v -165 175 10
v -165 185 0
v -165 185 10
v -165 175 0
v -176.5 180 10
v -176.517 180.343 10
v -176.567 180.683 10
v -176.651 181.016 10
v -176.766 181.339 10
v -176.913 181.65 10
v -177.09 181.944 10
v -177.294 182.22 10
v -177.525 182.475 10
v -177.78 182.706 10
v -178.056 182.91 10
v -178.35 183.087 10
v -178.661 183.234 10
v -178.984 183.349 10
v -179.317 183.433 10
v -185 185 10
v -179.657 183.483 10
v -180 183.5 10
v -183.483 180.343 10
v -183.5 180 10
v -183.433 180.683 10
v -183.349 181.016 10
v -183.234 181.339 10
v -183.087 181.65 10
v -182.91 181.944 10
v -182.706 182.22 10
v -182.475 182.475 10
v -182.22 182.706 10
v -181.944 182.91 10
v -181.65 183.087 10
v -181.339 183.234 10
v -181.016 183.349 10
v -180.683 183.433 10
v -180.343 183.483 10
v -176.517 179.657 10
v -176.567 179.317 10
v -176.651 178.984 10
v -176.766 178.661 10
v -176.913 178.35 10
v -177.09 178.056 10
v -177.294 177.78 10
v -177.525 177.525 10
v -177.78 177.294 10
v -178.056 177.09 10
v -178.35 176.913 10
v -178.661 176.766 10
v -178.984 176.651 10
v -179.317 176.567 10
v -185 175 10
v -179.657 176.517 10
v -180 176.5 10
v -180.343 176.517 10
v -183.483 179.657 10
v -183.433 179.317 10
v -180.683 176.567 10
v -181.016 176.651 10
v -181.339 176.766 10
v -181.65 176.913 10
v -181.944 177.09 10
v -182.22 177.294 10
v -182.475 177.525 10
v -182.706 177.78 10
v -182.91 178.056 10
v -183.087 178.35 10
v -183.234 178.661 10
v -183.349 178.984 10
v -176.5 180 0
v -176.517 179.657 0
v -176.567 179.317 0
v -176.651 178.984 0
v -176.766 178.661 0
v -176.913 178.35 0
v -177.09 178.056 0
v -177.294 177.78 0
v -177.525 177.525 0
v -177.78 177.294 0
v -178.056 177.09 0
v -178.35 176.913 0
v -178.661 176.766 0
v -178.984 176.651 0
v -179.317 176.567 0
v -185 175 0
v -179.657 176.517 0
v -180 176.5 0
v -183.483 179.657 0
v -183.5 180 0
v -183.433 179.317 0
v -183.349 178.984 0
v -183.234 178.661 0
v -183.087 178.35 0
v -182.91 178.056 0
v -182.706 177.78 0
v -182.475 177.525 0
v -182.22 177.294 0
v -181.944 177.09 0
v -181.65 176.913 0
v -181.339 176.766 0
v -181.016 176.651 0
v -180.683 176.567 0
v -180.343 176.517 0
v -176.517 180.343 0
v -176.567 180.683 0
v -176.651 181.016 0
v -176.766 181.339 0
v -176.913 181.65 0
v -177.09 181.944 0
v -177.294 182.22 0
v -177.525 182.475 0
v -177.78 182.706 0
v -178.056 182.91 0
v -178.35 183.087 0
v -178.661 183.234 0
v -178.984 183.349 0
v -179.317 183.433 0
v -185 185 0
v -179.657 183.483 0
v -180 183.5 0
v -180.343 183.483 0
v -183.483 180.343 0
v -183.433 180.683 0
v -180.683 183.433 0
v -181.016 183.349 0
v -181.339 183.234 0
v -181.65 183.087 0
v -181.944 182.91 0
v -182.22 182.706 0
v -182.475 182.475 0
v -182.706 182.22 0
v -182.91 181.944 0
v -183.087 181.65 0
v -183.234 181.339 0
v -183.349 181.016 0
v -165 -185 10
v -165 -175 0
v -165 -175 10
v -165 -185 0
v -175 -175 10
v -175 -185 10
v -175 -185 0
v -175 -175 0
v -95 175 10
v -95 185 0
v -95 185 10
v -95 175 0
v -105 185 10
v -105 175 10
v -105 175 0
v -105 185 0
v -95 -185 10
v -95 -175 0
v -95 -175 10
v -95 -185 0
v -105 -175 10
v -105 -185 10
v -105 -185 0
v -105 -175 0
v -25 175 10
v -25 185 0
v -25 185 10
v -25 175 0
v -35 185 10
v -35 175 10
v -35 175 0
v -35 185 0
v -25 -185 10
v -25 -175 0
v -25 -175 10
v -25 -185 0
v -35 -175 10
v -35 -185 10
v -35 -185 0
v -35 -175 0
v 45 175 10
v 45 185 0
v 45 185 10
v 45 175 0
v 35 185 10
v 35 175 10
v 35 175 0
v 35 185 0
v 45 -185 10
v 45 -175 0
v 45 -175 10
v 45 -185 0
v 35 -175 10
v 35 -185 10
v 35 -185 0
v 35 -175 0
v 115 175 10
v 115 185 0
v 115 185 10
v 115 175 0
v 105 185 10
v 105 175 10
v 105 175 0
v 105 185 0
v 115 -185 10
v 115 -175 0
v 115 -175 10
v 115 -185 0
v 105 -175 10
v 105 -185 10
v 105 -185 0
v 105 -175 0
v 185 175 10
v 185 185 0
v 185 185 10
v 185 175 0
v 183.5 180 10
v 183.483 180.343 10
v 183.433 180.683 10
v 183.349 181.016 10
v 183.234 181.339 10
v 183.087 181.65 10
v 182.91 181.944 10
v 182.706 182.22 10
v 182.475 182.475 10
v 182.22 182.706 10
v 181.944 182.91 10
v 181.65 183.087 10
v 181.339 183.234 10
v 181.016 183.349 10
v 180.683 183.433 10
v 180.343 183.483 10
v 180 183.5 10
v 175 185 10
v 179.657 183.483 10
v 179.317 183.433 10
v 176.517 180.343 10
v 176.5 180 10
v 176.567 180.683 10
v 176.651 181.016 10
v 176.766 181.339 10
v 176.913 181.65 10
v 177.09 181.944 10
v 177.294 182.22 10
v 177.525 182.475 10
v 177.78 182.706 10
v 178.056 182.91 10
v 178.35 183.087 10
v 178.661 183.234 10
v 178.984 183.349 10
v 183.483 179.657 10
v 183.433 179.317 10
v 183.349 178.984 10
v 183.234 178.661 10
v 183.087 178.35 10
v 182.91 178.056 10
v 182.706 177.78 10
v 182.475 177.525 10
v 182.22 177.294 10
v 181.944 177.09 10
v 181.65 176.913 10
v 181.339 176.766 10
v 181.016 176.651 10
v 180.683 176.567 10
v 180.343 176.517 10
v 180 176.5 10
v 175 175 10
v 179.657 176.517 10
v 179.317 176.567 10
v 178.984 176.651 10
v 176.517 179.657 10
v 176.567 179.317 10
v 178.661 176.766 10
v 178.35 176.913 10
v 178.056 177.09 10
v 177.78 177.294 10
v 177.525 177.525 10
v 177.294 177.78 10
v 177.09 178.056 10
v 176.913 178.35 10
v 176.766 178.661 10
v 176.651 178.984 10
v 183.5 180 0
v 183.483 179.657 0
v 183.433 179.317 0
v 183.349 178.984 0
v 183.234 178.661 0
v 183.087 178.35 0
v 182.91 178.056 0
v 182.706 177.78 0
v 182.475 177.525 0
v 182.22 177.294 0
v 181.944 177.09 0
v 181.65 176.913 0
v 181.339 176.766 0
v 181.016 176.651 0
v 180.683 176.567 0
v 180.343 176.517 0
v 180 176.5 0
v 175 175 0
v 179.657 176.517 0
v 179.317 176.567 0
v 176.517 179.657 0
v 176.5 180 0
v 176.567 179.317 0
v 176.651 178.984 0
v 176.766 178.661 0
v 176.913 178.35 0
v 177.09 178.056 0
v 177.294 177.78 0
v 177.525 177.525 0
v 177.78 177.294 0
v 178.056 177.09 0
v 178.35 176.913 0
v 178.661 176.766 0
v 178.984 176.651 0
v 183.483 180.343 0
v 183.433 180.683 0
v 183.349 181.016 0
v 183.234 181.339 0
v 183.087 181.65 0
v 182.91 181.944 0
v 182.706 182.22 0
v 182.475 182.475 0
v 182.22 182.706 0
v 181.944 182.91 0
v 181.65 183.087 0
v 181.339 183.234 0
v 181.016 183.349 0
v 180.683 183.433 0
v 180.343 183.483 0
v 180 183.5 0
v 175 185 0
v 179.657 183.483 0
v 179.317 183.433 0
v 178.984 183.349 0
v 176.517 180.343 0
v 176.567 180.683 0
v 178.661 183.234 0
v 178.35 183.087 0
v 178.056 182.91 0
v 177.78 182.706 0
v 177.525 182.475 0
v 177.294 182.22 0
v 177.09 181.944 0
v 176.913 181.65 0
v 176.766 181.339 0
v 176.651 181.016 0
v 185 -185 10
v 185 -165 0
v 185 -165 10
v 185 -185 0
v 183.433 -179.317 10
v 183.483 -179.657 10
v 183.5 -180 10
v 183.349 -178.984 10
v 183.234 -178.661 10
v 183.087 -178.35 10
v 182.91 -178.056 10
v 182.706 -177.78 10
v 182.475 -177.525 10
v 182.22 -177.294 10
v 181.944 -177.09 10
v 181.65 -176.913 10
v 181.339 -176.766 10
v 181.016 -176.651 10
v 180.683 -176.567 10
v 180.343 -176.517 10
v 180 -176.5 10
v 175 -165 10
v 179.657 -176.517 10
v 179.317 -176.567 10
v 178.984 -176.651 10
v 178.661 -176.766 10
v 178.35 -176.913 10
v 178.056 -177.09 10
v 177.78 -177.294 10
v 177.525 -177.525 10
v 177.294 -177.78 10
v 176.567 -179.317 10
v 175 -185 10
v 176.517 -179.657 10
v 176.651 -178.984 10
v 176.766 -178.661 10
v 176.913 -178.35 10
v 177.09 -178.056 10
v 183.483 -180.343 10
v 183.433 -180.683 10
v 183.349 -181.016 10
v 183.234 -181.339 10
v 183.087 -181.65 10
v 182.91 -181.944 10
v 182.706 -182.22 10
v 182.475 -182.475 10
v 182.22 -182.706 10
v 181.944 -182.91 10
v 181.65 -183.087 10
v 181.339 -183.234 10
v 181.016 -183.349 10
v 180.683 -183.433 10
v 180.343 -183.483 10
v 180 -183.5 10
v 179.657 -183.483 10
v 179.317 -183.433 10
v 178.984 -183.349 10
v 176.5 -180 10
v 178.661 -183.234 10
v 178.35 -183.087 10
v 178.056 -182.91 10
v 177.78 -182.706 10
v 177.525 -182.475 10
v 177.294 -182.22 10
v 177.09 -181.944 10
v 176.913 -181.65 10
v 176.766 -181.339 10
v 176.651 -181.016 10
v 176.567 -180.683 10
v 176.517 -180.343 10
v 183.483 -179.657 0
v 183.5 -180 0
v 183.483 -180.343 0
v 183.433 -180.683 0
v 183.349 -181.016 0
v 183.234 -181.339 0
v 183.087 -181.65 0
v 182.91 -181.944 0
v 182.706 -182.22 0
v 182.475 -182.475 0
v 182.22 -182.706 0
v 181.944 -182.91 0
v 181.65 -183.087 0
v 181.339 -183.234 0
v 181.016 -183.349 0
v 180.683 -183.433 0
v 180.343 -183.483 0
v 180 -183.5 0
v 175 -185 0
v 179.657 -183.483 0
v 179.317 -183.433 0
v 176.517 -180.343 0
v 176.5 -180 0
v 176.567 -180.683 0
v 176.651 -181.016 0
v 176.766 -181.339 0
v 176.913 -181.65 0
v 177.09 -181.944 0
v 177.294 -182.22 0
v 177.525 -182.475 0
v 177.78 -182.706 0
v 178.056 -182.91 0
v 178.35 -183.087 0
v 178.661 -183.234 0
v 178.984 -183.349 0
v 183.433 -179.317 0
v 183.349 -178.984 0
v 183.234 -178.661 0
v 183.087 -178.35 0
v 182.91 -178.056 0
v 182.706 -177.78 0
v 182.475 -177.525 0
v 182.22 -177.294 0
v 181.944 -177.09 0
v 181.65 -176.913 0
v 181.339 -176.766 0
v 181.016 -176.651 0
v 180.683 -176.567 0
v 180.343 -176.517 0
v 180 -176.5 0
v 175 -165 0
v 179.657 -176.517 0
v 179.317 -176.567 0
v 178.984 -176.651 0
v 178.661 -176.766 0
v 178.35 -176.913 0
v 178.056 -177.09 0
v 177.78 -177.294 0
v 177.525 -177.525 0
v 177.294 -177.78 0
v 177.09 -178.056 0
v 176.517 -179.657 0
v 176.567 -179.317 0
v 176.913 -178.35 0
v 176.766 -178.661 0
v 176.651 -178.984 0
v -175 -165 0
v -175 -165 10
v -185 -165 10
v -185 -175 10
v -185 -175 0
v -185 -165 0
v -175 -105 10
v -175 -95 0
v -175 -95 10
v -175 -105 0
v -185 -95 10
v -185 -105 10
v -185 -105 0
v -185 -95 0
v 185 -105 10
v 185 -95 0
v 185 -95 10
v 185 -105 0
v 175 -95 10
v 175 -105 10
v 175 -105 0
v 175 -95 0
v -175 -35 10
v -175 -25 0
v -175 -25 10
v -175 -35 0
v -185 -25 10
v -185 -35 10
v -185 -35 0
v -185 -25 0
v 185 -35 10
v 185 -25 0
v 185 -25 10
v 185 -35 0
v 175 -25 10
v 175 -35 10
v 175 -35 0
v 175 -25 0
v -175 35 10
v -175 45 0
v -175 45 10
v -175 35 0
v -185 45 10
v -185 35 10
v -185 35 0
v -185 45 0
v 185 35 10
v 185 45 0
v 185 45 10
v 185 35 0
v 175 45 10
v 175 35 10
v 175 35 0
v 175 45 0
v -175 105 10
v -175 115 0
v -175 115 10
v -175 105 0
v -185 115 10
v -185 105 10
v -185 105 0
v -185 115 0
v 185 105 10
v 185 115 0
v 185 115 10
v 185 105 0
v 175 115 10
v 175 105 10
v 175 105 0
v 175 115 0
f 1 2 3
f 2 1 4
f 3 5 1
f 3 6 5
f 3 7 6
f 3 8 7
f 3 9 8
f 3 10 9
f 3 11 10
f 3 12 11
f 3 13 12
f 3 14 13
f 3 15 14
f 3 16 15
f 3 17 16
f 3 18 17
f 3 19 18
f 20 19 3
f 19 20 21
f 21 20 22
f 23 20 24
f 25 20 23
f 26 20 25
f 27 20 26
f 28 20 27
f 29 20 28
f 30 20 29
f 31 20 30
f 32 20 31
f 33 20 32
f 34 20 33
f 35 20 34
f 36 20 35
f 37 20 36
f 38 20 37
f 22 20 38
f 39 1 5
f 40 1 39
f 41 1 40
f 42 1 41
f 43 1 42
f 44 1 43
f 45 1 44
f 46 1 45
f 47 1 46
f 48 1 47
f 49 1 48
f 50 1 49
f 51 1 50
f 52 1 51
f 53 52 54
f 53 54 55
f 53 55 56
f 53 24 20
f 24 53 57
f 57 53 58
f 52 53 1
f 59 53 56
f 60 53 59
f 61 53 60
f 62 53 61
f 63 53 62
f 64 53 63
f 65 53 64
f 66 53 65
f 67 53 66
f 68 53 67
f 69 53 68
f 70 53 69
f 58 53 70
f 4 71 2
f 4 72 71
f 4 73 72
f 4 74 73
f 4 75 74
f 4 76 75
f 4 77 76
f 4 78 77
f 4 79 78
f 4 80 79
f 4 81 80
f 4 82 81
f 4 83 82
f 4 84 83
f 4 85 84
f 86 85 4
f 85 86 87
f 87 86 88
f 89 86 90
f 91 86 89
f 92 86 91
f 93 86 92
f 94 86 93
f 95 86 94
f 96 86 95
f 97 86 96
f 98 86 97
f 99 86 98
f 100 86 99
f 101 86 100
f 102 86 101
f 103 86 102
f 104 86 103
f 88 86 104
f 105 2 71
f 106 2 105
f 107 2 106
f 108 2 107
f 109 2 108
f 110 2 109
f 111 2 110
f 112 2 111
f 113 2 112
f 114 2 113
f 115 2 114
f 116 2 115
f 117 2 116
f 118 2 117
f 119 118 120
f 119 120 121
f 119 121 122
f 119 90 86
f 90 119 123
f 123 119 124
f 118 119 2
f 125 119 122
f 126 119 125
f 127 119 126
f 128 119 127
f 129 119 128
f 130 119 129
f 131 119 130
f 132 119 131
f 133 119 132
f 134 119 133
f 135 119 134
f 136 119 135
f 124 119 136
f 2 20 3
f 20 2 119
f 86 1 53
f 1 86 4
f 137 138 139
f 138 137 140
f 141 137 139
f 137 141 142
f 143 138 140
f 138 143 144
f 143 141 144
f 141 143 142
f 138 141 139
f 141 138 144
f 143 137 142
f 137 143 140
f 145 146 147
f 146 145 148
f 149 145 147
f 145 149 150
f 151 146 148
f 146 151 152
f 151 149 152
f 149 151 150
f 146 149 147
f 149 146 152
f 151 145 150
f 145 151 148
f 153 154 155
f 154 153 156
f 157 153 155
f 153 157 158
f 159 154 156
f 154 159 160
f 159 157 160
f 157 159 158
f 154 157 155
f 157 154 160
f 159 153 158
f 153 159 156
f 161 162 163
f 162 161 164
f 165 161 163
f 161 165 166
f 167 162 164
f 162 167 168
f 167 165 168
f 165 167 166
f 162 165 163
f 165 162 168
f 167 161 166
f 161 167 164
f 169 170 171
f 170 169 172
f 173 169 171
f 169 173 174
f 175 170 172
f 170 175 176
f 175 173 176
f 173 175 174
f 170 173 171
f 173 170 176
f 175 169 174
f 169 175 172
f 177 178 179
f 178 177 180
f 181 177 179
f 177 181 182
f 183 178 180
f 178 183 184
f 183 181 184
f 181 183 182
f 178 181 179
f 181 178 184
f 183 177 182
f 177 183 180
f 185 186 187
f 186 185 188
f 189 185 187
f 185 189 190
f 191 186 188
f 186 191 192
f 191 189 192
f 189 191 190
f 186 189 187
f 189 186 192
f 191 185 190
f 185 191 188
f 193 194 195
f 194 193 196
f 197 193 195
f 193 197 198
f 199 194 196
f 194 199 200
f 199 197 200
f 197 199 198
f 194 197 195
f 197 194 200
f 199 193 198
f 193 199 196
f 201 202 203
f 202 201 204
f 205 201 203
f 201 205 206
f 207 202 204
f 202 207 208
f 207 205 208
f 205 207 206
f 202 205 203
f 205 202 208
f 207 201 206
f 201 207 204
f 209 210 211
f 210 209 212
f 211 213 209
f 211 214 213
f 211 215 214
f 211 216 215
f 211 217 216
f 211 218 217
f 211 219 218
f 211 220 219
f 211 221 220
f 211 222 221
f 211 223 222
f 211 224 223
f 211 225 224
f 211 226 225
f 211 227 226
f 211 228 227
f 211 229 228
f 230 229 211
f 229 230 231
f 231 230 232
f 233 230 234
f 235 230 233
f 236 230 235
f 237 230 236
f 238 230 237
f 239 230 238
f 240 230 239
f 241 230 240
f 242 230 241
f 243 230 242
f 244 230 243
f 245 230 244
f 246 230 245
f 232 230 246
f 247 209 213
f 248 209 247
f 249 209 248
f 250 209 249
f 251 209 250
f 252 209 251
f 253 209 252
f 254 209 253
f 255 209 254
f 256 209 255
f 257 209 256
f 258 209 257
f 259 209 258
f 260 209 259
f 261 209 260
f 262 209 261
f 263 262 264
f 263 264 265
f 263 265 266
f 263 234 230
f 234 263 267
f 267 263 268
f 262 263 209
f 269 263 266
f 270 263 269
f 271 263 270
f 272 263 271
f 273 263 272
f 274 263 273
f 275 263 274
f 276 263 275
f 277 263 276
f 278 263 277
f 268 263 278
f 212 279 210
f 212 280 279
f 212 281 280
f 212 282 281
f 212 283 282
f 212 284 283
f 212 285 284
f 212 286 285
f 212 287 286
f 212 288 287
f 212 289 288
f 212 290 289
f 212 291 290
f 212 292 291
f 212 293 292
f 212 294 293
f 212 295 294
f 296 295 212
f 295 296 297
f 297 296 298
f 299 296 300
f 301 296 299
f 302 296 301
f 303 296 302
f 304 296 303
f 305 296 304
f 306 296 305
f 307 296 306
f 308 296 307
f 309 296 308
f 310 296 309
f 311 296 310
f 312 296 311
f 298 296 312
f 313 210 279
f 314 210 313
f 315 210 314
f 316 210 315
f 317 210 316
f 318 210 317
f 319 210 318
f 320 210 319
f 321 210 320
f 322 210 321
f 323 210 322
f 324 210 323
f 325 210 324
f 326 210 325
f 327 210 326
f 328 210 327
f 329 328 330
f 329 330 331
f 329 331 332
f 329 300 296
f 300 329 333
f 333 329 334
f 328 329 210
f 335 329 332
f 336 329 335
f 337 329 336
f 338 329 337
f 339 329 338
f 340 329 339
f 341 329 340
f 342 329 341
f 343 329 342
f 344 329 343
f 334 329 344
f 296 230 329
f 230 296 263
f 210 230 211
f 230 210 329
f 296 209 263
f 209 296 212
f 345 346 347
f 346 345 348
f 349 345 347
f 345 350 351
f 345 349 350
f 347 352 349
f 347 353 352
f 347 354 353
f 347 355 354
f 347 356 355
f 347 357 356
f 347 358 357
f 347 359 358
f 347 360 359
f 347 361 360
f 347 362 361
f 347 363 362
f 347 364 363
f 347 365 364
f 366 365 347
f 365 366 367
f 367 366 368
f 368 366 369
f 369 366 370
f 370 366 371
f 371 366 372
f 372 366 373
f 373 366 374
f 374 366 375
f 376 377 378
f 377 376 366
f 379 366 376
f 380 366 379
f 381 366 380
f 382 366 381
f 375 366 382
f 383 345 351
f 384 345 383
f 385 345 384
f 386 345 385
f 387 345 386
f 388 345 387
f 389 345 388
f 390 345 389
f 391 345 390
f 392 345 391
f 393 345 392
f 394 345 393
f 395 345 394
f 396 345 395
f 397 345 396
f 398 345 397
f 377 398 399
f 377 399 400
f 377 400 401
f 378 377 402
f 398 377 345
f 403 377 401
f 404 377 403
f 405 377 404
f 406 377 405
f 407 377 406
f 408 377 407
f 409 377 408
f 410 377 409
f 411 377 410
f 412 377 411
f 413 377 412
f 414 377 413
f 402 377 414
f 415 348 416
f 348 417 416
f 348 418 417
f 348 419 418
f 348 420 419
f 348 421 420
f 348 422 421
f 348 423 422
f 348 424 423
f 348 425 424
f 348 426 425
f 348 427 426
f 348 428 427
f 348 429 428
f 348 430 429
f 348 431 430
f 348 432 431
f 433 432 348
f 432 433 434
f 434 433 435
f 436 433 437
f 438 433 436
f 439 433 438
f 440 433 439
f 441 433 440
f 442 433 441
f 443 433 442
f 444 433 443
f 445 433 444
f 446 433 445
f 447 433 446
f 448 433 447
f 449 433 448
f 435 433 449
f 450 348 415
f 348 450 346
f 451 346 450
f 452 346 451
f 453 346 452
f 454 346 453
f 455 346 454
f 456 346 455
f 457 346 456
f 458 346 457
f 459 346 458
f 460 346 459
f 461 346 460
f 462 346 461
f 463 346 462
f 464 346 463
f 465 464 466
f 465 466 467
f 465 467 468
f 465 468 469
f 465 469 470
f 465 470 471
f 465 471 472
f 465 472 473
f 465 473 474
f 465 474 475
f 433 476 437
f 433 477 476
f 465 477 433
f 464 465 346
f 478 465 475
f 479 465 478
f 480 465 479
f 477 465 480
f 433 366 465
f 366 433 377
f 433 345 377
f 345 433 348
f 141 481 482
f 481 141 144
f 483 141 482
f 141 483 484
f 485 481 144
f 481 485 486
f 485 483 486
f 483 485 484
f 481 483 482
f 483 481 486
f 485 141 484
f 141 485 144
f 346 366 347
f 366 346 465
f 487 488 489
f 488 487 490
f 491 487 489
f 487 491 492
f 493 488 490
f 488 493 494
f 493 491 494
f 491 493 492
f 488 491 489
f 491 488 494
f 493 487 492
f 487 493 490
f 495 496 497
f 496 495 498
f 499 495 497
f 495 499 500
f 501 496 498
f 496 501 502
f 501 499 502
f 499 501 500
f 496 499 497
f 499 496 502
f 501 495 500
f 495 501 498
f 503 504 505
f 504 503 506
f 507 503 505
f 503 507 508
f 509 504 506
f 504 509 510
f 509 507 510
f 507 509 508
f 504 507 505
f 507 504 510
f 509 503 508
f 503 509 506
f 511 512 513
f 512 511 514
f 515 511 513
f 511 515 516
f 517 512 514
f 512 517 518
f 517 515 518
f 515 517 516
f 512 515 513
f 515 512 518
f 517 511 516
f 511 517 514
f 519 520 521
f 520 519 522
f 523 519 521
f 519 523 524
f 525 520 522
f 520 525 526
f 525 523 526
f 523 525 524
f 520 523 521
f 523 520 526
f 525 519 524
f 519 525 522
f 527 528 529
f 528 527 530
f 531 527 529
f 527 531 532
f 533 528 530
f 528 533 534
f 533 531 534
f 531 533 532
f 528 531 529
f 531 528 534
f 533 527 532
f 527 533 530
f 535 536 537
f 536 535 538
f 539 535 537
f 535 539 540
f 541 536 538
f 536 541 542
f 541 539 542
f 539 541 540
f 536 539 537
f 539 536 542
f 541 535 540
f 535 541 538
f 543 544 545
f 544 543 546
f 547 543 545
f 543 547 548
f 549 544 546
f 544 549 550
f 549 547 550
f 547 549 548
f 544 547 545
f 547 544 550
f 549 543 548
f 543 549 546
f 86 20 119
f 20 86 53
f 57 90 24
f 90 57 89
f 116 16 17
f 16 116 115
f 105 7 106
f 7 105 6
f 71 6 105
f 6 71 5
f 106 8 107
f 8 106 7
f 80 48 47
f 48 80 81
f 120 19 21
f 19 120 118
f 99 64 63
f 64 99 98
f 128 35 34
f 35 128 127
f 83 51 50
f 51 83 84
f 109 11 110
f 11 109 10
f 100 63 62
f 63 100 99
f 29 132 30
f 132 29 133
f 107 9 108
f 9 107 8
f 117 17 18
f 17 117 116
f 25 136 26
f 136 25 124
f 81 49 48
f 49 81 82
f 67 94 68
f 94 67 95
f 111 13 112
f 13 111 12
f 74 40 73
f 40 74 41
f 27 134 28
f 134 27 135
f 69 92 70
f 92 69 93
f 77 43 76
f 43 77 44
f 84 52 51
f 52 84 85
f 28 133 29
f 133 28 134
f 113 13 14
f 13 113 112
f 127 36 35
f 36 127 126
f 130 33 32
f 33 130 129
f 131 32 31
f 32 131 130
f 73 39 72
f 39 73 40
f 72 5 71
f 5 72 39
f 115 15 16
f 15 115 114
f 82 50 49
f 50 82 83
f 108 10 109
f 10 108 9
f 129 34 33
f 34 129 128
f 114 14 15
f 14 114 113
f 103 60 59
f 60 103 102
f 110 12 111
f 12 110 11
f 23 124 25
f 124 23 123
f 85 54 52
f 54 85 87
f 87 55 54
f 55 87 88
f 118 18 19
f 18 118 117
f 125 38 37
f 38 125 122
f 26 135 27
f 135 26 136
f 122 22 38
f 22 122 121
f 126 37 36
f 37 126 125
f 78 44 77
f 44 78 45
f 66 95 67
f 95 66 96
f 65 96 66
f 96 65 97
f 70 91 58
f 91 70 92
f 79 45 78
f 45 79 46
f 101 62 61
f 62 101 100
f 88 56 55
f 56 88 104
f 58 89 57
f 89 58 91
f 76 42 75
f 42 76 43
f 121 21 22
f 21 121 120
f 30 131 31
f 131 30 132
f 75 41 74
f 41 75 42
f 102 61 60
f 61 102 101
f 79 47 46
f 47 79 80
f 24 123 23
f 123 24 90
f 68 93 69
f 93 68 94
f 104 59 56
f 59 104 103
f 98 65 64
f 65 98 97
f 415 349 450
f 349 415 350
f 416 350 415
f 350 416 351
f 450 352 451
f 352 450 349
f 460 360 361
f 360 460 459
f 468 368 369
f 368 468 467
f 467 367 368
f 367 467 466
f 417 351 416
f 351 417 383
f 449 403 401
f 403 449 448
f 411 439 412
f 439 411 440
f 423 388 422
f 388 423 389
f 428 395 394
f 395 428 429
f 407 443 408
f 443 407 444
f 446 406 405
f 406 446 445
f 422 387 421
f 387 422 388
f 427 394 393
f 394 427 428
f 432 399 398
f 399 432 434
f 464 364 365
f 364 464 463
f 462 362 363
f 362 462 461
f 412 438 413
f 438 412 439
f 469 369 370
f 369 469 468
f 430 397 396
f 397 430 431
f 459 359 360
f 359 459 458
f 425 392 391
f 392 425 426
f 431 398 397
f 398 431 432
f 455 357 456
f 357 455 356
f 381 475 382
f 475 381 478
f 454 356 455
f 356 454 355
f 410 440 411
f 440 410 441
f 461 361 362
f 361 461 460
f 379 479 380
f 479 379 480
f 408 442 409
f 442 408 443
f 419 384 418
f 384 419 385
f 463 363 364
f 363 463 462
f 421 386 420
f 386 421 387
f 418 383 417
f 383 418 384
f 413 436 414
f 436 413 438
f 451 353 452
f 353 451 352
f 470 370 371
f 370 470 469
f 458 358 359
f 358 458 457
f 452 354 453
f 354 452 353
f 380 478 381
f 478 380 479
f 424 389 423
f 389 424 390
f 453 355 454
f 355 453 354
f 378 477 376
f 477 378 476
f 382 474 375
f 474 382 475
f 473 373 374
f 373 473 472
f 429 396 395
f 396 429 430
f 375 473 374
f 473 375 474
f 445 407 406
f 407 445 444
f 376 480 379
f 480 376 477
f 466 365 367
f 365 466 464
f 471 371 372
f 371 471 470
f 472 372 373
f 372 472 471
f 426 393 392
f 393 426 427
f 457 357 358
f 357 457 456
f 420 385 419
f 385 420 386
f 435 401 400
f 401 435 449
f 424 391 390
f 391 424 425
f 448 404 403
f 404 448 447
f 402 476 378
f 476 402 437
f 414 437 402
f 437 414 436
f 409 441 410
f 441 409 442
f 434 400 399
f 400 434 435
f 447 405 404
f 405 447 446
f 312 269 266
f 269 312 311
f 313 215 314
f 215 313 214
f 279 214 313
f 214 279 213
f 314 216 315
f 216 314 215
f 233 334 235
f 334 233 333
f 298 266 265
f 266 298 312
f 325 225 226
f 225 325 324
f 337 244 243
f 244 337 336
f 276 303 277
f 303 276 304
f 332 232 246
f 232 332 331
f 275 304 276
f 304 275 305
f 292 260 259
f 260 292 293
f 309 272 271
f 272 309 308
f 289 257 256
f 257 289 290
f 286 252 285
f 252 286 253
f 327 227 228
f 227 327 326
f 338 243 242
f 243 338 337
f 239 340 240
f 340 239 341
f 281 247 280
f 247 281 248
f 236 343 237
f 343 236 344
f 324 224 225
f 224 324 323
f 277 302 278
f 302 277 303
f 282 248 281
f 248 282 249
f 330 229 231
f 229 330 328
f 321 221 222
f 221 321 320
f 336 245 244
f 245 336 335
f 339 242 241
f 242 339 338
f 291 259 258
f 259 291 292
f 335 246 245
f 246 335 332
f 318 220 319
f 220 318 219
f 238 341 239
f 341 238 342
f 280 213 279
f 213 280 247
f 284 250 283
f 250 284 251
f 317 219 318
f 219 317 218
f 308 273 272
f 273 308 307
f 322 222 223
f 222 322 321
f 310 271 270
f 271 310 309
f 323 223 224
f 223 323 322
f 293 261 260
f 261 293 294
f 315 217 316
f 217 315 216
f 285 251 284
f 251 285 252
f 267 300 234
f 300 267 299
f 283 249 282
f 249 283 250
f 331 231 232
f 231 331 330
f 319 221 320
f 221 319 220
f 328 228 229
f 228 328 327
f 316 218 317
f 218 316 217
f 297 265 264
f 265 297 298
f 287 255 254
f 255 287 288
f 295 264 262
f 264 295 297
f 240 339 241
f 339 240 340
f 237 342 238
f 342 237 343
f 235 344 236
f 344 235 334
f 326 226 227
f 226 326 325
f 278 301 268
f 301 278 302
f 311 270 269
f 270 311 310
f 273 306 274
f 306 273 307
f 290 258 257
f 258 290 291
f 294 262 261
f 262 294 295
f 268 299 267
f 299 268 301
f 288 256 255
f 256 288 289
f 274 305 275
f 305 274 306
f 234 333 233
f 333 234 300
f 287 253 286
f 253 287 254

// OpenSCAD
// ring_38.scad - ring index 38 (z bottom = 380 mm)
$fn = 64; bar = 10; half_b = bar/2; outer = 370; half_outer = outer/2;
front_y = 180; back_y = -180; left_x = -180; right_x = 180;
x_centers = [-170, -100, -30, 40, 110, 180];
z_centers = [5, 85, 155, 225, 295, 365, 435, 505, 575, 645, 715]; ring_z = 380;
module place_box(cx, cy, sx, sy) { translate([cx - sx/2, cy - sy/2, 0]) cube([sx, sy, bar]); }

difference() { union() {
    for (x = x_centers) { place_box(x, front_y, bar, bar); place_box(x, back_y, bar, bar); }
    for (y = x_centers) { place_box(left_x, y, bar, bar); place_box(right_x, y, bar, bar); }
    for (zc = z_centers) if ((zc - half_b < ring_z + bar) && (zc + half_b > ring_z)) {
        translate([-half_outer, front_y - half_b, 0]) cube([outer, bar, bar]);
        translate([-half_outer, back_y - half_b, 0])  cube([outer, bar, bar]);
        translate([left_x - half_b, -half_outer, 0])  cube([bar, outer, bar]);
        translate([right_x - half_b, -half_outer, 0]) cube([bar, outer, bar]);
    }
  }
  for (cx = [-180, 180]) for (cy = [-180, 180]) translate([cx, cy, 0]) cylinder(h = bar, r = 3.5, $fn = 64);
}
